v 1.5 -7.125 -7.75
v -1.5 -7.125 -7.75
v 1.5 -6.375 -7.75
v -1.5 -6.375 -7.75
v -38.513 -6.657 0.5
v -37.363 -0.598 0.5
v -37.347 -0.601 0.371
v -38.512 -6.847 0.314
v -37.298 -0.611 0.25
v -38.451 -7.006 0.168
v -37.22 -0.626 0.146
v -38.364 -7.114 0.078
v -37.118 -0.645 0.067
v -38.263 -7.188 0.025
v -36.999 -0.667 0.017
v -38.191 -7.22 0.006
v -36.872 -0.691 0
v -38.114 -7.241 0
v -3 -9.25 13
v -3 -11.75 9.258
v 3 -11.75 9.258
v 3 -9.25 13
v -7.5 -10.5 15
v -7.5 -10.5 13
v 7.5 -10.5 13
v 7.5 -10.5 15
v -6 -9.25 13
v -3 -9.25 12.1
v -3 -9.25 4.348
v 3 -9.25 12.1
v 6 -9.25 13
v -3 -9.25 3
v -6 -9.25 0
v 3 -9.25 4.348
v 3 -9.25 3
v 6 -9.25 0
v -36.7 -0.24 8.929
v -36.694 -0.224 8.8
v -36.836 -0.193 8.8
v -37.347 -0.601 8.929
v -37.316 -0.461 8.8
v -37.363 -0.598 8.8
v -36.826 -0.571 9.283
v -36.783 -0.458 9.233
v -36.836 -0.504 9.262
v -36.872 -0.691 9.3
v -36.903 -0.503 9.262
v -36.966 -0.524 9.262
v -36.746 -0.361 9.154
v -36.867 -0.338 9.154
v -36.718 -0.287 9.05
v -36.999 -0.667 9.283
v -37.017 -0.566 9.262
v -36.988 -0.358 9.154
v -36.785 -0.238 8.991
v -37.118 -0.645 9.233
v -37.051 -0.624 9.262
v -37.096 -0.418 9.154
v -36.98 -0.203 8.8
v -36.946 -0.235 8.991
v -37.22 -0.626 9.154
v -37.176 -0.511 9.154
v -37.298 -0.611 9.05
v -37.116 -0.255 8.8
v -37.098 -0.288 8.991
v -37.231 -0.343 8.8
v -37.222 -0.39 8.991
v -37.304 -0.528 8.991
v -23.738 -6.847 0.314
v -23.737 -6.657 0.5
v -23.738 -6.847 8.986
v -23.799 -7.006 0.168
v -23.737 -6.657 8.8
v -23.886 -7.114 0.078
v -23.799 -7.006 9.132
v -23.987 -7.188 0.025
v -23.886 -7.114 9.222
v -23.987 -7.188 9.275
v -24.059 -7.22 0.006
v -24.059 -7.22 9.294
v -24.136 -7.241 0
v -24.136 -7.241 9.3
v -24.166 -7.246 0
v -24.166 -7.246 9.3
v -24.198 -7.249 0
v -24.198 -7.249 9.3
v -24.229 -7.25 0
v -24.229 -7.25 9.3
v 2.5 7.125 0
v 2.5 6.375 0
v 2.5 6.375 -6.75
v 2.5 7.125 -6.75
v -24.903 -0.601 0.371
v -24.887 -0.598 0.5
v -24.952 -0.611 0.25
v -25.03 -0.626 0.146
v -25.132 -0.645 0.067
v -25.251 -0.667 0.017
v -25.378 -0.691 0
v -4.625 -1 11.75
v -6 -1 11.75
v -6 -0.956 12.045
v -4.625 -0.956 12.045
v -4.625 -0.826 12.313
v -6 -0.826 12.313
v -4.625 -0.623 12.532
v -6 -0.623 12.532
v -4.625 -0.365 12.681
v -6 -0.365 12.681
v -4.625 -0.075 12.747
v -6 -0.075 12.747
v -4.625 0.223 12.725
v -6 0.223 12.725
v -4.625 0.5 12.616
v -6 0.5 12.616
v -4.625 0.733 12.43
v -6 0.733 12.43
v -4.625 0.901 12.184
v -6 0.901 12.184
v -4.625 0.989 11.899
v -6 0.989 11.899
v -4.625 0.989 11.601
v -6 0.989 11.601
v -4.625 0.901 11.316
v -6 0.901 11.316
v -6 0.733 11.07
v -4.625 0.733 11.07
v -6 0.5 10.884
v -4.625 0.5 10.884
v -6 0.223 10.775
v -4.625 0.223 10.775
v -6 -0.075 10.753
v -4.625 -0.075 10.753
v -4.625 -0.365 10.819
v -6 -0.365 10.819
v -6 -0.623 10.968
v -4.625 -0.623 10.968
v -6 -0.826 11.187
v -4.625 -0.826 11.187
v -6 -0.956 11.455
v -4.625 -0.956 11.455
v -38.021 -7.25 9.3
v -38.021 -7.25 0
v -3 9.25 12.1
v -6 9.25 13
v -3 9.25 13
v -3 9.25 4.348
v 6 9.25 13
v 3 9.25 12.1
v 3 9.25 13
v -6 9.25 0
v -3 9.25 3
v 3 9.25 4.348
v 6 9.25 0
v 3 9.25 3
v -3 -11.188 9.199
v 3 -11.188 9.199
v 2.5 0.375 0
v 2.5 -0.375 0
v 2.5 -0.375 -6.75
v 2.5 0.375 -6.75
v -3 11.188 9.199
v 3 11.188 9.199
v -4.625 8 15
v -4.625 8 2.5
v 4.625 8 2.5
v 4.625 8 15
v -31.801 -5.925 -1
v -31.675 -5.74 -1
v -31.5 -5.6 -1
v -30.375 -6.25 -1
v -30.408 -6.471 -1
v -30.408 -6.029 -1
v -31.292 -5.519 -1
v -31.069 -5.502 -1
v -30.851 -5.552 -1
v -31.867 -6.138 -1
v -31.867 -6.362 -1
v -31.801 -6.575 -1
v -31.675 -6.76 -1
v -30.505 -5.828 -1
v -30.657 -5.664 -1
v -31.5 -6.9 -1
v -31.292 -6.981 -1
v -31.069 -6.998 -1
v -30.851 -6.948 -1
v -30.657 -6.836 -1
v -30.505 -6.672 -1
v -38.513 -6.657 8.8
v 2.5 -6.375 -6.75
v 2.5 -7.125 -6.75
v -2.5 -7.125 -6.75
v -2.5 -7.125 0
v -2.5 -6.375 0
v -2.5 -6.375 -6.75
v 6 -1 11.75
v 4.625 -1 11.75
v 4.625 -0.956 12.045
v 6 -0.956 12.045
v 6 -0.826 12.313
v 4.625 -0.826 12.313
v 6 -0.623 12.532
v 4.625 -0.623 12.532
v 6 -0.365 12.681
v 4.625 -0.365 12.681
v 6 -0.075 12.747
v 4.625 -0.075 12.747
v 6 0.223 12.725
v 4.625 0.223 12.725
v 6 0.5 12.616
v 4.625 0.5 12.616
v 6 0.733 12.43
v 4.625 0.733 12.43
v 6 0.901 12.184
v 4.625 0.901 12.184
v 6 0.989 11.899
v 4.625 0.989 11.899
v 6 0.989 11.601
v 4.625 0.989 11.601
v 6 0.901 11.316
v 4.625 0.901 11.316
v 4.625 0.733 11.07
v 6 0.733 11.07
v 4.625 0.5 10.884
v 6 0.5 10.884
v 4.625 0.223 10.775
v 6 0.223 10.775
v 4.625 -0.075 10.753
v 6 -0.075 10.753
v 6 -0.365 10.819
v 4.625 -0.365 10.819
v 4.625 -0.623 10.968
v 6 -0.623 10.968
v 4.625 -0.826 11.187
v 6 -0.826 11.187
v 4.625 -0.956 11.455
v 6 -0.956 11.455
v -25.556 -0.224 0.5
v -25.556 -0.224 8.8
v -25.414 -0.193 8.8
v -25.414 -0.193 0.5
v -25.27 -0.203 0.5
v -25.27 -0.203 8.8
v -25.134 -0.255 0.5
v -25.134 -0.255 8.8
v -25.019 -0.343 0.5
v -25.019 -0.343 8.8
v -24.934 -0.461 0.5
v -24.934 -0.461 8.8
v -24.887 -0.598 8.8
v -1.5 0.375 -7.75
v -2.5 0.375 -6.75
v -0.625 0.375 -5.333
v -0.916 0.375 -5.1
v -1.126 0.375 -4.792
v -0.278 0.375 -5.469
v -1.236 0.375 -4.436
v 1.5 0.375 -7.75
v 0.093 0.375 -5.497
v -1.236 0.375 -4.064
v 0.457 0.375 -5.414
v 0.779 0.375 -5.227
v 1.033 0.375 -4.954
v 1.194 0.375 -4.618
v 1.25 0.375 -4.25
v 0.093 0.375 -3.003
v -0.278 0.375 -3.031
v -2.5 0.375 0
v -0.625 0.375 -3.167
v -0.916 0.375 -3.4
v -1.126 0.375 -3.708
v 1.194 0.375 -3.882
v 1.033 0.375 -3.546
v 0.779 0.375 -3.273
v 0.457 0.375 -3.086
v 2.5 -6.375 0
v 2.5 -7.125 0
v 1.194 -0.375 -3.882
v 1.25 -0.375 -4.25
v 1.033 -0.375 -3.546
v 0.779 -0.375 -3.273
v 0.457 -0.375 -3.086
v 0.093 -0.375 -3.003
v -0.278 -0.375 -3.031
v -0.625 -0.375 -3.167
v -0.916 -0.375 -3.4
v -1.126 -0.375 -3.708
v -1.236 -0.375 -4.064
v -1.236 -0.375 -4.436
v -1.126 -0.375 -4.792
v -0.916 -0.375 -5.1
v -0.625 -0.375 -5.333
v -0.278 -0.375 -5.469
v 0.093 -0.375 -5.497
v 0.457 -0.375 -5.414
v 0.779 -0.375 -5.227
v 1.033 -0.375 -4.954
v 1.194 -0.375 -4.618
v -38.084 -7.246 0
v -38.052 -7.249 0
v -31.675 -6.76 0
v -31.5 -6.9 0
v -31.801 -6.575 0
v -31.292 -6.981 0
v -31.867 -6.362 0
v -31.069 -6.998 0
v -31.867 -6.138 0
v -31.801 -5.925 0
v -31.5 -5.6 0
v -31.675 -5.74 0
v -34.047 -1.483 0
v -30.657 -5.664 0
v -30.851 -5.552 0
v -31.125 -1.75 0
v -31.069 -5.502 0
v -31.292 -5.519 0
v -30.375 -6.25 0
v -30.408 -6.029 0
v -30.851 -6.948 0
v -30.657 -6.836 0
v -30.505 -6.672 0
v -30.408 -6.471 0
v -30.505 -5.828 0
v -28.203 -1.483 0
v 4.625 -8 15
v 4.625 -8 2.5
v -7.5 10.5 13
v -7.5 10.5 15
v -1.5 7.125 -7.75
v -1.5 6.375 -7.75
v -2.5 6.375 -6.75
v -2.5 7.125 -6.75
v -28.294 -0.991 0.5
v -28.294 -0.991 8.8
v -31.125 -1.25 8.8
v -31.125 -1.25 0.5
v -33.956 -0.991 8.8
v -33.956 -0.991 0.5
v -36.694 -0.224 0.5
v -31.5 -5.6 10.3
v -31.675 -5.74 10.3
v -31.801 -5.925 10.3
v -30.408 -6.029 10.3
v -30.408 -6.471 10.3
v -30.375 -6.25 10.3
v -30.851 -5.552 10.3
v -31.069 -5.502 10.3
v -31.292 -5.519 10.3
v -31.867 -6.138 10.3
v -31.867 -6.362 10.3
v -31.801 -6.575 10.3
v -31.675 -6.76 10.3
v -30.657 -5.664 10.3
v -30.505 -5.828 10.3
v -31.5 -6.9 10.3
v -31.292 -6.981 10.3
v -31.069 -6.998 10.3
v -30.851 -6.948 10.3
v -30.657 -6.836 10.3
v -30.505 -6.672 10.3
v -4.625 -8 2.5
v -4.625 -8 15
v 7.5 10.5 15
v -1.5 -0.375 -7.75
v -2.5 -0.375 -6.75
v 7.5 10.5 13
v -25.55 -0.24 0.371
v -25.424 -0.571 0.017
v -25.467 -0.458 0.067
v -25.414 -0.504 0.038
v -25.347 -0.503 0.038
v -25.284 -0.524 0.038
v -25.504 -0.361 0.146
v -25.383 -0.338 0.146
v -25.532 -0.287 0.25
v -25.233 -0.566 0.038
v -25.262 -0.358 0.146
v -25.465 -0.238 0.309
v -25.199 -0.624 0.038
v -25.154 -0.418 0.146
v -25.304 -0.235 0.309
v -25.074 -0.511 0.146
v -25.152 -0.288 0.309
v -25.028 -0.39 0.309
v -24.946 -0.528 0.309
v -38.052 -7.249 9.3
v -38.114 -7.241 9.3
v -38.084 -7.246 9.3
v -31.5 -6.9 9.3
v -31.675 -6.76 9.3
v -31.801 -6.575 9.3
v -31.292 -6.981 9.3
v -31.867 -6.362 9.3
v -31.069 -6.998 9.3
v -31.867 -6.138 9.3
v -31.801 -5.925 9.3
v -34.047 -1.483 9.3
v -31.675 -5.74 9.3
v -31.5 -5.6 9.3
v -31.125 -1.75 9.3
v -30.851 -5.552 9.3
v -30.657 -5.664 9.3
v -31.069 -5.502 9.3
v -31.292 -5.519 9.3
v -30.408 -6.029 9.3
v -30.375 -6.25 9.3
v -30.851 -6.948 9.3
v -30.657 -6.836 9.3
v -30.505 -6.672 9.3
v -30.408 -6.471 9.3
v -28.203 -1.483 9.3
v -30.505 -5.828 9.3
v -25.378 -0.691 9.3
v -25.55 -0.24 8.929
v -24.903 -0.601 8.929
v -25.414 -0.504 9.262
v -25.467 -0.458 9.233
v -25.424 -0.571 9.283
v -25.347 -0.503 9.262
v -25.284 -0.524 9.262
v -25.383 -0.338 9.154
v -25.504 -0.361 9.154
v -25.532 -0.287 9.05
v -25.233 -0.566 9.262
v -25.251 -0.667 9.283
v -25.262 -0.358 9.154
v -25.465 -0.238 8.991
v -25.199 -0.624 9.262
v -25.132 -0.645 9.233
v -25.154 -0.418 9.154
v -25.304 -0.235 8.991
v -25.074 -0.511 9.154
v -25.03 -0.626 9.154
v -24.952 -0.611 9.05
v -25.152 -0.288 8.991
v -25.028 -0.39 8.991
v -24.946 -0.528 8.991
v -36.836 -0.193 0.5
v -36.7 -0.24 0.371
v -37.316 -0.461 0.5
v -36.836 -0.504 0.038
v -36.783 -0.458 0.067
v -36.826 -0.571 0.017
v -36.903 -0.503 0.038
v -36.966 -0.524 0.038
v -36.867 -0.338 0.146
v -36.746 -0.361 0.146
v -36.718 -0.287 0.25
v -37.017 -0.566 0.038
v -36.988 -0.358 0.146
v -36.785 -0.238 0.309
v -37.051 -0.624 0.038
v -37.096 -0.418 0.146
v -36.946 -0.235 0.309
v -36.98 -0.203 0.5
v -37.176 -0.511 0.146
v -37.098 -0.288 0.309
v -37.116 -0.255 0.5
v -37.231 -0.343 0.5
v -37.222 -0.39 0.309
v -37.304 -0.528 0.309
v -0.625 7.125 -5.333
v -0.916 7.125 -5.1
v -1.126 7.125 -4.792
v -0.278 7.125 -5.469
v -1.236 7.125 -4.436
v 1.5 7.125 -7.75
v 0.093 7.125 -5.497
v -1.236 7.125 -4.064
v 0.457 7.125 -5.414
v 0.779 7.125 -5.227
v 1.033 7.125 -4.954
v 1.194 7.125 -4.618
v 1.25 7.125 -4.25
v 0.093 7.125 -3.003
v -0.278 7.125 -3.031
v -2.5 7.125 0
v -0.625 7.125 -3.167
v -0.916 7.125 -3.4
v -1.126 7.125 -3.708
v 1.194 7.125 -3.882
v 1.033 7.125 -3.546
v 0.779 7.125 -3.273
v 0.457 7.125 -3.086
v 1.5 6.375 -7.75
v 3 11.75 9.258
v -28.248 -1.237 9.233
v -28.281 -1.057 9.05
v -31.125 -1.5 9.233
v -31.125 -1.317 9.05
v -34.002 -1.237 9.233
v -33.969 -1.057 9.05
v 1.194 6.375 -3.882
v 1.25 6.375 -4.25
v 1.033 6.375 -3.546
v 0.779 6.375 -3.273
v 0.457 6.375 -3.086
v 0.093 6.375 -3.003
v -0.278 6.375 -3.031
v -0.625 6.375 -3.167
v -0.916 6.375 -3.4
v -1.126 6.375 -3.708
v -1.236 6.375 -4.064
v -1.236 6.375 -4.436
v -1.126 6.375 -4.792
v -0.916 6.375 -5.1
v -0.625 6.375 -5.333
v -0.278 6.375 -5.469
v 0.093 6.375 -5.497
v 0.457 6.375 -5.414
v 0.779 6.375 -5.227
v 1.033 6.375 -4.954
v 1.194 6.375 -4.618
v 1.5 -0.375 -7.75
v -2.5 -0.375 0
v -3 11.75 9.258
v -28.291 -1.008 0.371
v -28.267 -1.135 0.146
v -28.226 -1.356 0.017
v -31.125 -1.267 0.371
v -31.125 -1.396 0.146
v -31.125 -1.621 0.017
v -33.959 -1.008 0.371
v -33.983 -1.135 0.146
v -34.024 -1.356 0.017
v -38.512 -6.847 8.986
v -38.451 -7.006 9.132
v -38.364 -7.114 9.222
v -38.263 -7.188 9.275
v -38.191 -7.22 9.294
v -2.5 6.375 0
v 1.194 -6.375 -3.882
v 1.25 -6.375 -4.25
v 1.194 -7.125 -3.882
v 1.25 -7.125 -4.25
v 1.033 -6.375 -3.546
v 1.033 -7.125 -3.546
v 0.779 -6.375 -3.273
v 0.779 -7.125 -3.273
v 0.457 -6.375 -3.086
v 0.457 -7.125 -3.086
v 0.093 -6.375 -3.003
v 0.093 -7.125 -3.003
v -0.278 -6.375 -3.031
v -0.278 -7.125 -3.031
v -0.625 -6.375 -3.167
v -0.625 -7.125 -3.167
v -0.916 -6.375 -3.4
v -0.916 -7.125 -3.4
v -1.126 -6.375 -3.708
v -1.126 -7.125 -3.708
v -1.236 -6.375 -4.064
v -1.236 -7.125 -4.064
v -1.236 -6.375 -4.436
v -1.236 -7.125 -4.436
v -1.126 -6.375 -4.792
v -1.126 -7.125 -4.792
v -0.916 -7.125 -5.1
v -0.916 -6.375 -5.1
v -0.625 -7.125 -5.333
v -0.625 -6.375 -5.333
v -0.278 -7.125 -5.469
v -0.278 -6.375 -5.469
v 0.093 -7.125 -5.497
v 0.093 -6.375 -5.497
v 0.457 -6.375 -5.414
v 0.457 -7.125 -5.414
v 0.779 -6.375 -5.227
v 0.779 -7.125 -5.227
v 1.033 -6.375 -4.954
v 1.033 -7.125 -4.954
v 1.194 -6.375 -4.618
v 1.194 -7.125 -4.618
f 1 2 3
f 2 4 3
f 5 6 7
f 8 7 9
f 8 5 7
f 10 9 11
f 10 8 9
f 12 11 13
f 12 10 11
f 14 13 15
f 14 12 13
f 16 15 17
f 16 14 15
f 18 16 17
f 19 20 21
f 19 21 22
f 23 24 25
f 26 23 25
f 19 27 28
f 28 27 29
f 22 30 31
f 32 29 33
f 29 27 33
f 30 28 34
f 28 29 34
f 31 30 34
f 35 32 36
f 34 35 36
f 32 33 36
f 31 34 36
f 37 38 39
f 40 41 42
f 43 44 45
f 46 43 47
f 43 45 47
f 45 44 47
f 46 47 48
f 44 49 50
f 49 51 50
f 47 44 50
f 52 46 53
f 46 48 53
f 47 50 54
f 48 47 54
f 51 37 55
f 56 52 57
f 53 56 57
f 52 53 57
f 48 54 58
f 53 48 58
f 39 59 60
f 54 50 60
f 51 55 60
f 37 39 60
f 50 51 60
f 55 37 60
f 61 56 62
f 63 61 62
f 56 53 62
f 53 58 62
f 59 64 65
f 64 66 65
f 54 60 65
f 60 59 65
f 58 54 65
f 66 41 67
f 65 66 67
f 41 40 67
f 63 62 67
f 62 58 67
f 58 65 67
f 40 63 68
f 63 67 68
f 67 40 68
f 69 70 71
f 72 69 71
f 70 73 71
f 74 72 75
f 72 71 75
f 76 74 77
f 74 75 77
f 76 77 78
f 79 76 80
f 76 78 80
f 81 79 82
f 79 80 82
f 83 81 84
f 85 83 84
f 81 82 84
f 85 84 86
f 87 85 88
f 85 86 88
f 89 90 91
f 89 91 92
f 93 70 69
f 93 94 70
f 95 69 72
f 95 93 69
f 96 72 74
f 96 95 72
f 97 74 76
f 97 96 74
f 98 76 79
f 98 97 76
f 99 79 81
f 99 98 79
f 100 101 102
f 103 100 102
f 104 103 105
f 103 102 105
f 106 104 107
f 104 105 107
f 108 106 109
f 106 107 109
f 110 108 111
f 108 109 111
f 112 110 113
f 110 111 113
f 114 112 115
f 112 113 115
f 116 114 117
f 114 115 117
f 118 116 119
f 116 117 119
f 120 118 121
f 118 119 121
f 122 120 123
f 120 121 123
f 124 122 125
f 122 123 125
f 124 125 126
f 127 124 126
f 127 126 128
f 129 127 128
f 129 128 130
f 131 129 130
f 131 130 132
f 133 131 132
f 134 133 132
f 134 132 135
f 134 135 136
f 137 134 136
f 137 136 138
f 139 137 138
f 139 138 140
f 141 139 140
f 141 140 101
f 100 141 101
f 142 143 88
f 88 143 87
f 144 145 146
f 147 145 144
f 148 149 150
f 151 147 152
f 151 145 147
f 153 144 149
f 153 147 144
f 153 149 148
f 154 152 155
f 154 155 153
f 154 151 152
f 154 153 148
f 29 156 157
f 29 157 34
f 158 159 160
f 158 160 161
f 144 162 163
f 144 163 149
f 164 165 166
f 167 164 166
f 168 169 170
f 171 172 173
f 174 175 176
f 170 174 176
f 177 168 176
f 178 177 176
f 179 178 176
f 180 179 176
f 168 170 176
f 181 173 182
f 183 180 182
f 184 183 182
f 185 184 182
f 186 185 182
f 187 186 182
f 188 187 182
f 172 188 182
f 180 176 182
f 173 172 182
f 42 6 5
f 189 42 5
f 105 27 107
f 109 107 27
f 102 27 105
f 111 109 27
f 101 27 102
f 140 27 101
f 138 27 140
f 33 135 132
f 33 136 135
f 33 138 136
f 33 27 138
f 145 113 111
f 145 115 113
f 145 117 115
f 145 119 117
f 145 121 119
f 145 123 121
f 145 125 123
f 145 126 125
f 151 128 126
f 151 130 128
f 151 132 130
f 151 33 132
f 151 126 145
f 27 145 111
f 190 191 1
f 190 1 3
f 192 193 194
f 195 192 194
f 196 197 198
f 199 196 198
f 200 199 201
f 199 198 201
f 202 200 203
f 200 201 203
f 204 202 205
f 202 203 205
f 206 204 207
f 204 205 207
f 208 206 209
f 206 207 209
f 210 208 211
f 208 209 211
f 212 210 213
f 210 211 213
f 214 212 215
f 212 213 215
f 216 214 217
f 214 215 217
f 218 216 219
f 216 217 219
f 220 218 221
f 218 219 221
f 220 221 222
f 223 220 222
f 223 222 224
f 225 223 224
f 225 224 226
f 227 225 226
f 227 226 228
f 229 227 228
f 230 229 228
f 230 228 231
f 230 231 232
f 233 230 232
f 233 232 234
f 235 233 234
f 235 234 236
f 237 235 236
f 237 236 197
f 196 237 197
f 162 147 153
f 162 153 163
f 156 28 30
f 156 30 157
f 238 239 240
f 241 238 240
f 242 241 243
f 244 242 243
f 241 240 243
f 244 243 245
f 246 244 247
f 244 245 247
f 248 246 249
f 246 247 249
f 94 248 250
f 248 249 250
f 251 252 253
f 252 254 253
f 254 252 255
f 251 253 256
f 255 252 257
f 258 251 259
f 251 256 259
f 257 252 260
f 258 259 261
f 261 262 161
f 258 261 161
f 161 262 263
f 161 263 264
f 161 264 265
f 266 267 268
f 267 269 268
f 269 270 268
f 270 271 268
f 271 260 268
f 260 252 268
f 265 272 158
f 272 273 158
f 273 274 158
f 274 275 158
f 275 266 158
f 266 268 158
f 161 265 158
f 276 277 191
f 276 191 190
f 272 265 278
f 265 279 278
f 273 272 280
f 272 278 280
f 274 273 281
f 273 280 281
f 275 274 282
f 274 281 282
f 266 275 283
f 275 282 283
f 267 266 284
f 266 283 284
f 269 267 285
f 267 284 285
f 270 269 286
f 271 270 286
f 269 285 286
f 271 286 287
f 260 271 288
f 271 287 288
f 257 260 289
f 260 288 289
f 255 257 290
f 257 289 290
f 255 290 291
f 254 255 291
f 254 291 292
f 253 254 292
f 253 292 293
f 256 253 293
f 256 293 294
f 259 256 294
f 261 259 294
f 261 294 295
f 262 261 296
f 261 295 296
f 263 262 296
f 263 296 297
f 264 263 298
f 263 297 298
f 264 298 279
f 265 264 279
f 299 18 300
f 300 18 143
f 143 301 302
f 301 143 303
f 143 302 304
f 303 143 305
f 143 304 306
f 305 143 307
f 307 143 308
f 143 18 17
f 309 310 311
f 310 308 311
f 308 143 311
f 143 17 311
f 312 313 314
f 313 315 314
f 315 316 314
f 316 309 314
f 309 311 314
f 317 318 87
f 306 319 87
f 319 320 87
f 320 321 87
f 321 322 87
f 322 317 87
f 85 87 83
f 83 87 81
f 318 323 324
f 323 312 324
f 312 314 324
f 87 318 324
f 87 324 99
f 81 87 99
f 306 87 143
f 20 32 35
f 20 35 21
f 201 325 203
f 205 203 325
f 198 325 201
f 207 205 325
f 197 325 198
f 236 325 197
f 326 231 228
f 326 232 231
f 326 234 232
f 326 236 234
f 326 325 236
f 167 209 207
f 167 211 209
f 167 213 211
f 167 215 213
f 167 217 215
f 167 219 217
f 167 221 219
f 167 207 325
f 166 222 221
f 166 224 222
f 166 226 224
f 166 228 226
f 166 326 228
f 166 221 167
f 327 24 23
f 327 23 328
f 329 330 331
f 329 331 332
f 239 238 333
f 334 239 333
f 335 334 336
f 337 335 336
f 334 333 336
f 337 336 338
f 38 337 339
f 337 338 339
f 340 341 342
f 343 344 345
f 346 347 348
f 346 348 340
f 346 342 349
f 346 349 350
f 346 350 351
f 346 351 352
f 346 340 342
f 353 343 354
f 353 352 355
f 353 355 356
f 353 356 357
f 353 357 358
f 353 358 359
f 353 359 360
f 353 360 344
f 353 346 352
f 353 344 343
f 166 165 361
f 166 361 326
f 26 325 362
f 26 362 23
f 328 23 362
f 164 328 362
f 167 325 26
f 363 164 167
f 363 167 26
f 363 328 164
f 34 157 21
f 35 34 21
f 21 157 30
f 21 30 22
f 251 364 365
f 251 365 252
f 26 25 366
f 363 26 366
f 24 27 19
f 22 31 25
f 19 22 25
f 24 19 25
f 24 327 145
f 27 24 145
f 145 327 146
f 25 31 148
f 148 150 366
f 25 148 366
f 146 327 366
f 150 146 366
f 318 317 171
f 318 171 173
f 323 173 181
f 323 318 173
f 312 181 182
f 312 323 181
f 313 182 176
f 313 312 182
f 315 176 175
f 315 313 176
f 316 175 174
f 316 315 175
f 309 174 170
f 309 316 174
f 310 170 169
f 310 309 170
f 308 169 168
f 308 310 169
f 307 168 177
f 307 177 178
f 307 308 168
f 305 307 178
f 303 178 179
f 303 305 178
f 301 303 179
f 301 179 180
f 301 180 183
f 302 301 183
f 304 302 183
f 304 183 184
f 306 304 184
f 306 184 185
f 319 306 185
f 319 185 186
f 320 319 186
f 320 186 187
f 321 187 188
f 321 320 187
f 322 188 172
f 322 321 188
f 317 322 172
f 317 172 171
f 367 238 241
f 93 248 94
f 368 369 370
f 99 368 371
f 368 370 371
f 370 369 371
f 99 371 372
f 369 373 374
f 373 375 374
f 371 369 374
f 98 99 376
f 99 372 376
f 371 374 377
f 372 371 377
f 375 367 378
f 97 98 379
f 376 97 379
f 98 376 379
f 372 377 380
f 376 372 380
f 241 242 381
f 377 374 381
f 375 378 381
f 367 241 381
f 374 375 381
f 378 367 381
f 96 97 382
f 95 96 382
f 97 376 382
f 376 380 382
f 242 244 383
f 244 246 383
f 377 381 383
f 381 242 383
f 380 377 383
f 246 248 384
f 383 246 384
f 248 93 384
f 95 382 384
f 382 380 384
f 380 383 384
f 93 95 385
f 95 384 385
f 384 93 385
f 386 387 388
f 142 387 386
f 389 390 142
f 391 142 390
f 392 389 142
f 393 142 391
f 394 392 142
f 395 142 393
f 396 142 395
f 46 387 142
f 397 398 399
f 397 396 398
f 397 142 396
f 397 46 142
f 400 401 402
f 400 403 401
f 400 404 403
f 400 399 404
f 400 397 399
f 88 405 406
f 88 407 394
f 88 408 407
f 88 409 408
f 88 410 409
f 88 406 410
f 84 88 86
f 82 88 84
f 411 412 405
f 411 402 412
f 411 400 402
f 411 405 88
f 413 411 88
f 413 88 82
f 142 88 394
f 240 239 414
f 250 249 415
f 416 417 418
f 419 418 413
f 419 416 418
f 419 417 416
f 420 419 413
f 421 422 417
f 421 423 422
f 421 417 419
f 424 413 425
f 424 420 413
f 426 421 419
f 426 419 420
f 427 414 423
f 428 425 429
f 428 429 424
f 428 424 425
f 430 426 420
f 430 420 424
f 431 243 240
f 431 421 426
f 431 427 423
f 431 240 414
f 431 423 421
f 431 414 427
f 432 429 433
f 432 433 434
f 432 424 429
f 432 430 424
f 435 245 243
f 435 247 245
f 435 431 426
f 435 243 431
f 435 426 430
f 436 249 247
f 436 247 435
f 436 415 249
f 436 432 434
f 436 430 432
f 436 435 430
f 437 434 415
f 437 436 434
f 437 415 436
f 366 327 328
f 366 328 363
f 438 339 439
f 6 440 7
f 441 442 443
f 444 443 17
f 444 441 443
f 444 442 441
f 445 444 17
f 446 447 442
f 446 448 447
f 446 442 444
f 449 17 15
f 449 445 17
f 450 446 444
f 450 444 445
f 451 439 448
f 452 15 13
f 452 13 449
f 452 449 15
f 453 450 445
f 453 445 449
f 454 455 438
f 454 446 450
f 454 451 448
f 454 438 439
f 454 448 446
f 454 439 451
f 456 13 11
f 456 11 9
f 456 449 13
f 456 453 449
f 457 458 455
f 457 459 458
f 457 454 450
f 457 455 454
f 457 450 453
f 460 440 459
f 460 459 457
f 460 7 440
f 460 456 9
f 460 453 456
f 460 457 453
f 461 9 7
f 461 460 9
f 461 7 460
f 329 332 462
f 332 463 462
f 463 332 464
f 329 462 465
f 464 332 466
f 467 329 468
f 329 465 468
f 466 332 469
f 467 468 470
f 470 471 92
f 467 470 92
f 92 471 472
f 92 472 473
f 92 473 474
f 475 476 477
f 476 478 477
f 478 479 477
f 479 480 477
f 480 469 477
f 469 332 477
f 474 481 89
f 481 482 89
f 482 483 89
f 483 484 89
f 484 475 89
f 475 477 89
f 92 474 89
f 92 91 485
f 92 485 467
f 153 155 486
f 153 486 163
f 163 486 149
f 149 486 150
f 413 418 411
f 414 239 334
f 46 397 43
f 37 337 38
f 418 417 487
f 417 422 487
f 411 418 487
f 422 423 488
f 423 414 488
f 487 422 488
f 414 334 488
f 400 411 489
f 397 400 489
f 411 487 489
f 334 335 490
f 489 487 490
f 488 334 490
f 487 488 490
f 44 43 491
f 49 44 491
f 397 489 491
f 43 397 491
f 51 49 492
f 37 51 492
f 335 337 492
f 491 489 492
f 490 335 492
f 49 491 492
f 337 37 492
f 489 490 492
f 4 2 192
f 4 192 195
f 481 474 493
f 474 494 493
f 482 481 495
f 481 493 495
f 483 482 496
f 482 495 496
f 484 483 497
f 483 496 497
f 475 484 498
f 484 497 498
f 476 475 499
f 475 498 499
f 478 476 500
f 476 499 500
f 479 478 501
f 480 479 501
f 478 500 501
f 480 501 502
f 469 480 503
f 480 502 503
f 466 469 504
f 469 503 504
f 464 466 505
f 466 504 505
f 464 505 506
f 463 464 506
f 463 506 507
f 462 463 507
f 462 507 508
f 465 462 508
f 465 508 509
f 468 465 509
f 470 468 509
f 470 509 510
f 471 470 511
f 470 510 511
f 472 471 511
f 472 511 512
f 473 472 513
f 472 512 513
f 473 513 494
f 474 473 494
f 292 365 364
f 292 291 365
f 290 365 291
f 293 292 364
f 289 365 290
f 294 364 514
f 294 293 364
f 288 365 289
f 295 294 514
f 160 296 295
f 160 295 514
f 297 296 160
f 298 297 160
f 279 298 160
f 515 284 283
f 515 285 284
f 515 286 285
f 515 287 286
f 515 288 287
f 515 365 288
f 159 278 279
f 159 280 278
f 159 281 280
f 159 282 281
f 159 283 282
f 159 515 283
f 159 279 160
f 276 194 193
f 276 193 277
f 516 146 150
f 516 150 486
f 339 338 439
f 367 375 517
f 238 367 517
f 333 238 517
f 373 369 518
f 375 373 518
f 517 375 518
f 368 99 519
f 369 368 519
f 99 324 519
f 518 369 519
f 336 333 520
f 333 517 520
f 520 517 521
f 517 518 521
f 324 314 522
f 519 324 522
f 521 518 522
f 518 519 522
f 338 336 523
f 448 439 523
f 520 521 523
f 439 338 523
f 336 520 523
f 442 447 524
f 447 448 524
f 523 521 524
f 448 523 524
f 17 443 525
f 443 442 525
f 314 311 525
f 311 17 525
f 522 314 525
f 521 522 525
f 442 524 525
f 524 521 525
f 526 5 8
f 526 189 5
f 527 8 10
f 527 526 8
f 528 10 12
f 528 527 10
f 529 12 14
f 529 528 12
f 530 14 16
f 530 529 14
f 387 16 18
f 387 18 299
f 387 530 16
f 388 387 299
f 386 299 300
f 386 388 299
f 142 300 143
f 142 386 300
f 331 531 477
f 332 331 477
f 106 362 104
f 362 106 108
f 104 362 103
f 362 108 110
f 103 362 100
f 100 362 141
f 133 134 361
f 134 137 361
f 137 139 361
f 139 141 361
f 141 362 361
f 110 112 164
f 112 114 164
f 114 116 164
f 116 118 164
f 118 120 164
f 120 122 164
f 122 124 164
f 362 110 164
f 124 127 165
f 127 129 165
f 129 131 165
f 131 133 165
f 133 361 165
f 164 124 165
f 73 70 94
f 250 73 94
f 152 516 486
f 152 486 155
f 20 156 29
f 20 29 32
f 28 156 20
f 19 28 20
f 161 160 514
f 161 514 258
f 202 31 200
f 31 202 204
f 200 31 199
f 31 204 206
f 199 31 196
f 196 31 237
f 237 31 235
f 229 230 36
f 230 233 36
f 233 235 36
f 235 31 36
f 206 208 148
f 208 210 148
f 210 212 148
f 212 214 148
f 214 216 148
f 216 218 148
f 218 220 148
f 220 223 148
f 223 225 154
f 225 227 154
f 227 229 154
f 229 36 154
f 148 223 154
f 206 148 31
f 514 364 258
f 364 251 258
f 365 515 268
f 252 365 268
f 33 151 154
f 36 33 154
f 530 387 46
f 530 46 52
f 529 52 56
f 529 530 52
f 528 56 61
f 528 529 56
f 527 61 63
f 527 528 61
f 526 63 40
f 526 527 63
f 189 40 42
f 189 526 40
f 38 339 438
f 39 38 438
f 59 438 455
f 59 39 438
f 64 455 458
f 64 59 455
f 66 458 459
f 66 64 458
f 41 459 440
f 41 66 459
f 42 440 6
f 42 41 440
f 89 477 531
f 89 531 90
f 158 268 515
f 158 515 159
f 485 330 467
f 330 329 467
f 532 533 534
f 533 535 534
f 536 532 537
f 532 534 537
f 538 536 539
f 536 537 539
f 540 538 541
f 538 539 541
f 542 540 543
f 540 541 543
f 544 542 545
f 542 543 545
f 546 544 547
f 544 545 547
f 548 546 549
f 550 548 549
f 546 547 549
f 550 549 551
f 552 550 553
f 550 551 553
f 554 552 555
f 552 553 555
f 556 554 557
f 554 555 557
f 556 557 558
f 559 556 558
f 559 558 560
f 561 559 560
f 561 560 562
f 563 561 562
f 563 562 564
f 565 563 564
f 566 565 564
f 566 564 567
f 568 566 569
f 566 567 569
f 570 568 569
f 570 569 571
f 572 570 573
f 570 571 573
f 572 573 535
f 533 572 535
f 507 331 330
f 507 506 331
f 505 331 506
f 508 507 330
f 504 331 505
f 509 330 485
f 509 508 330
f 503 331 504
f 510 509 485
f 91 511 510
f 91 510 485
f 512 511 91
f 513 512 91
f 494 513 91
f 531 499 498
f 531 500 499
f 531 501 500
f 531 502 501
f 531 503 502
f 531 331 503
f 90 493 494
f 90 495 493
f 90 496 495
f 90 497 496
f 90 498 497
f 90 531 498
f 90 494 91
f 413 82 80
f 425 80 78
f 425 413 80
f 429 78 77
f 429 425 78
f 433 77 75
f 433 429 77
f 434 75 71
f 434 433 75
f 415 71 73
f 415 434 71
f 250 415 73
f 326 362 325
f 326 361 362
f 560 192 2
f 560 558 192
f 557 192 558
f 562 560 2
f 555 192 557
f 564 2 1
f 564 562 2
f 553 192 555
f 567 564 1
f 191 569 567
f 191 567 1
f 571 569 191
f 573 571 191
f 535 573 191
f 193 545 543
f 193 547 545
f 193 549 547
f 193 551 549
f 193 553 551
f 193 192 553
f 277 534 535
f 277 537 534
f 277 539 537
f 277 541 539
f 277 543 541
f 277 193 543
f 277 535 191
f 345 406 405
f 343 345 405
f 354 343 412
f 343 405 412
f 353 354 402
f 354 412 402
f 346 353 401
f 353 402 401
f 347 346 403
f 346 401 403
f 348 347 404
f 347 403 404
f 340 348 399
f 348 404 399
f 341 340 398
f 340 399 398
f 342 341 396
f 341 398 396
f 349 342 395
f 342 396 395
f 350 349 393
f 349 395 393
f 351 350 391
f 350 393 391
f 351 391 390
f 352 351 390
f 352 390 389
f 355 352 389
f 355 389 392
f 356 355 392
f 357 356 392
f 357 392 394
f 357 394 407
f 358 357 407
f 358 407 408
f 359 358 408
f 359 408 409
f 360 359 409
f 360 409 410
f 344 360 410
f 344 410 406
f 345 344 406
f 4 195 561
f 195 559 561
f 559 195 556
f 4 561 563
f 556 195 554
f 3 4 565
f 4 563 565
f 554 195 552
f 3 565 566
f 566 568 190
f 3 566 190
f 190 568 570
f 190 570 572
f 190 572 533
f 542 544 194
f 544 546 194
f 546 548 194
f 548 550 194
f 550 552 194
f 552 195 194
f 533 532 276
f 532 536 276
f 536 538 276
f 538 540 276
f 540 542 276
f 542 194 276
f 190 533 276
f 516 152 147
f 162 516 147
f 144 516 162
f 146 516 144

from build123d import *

# Parameters (mm, degrees)
F0_W           = 5
F0_H           = 0.75
F1_DEPTH       = 7.75
F0_W_2         = 12
F0_H_2         = 18.5
F0_W_3         = 9.25
F0_H_3         = 16
F2_DEPTH       = 13
F3_DEPTH       = 2.5
F4_START       = 13
F0_W_4         = 15
F0_H_4         = 21
F4_DEPTH       = 2
F5_R           = 1
F6_DEPTH       = 13.501
F7_START       = -3
F7_DEPTH       = 6
F8_R           = 1.25
F9_DEPTH       = 12.5
F10_SIZE       = 1
F10_2_SIZE     = 1
F10_3_SIZE     = 1
F11_R          = 0.75
F12_DEPTH      = 9.3
F13_DEPTH      = 10.3
F13_DEPTH_BACK = 1
F14_R          = 0.5


with BuildPart() as f1:
    # F0 (on Top) → F1 (new body)
    with BuildSketch(Plane.XY):
        Rectangle(F0_W, F0_H)
    extrude(amount=-F1_DEPTH)


with BuildPart() as f1b:
    # F0 (on Top) → F1, piece 2 (new body)
    with BuildSketch(Plane.XY):
        with Locations((0, 6.75)):
            Rectangle(F0_W, F0_H)
    extrude(amount=-F1_DEPTH)


with BuildPart() as f1c:
    # F0 (on Top) → F1, piece 3 (new body)
    with BuildSketch(Plane.XY):
        with Locations((0, -6.75)):
            Rectangle(F0_W, F0_H)
    extrude(amount=-F1_DEPTH)


with BuildPart() as f2:
    # F0 (on Top) → F2 (new body)
    with BuildSketch(Plane.XY):
        Rectangle(F0_W_2, F0_H_2)
        Rectangle(F0_W_3, F0_H_3, mode=Mode.SUBTRACT)
    extrude(amount=F2_DEPTH)

    # F0 (on Top) → F3 (join)
    with BuildSketch(Plane.XY):
        Rectangle(F0_W_3, F0_H_3)
        with Locations((0, -6.75)):
            Rectangle(F0_W, F0_H, mode=Mode.SUBTRACT)
        Rectangle(F0_W, F0_H, mode=Mode.SUBTRACT)
        with Locations((0, 6.75)):
            Rectangle(F0_W, F0_H, mode=Mode.SUBTRACT)
        with Locations((0, 6.75)):
            Rectangle(F0_W, F0_H)
        Rectangle(F0_W, F0_H)
        with Locations((0, -6.75)):
            Rectangle(F0_W, F0_H)
    extrude(amount=F3_DEPTH)

    # F0 (on Top) → F4 (join)
    with BuildSketch(Plane.XY.offset(F4_START)):
        Rectangle(F0_W_4, F0_H_4)
        Rectangle(F0_W_2, F0_H_2, mode=Mode.SUBTRACT)
        Rectangle(F0_W_2, F0_H_2)
        Rectangle(F0_W_3, F0_H_3, mode=Mode.SUBTRACT)
    extrude(amount=F4_DEPTH)

    # F5 (on face) → F6 (cut, through all)
    with BuildSketch(Plane(origin=(-6, 0, 0), x_dir=(0, -1, 0), z_dir=(-1, 0, 0))):
        with Locations((0, 11.75)):
            Circle(F5_R)
    extrude(amount=-F6_DEPTH, mode=Mode.SUBTRACT)

    # F5 (on face) → F7 (join)
    with BuildSketch(Plane(origin=(-6, 0, 0), x_dir=(0, -1, 0), z_dir=(-1, 0, 0)).offset(F7_START)):
        Polygon((-9.25, 12.1), (-9.25, 13), (-11.75, 9.2583426132), (-9.25, 3), (-9.25, 4.3478405286), (-11.1880398678, 9.199407525), align=None)
        Polygon((11.75, 9.2583426132), (9.25, 13), (9.25, 12.1), (11.1880398678, 9.199407525), (9.25, 4.3478405286), (9.25, 3), align=None)
    extrude(amount=-F7_DEPTH)


with BuildPart() as f9_tool:
    # F8 (on Front) → F9 (new body, symmetric)
    with BuildSketch(Plane.XZ):
        with Locations((0, -4.25)):
            Circle(F8_R)
    extrude(amount=F9_DEPTH, both=True)


with BuildPart() as f1_1:
    add(f1.part)

    # F9: cut by f9_tool
    add(f9_tool.part, mode=Mode.SUBTRACT)

    # F10#2
    f10_2_edges = [f1_1.edges().sort_by_distance(p)[0] for p in [
        (-2.5, 0, -7.75),
        (2.5, 0, -7.75),
    ]]
    chamfer(f10_2_edges, length=F10_2_SIZE)


with BuildPart() as f1b_1:
    add(f1b.part)

    # F9: cut by f9_tool
    add(f9_tool.part, mode=Mode.SUBTRACT)

    # F10
    f10_edges = [f1b_1.edges().sort_by_distance(p)[0] for p in [
        (2.5, 6.75, -7.75),
        (-2.5, 6.75, -7.75),
    ]]
    chamfer(f10_edges, length=F10_SIZE)


with BuildPart() as f1c_1:
    add(f1c.part)

    # F9: cut by f9_tool
    add(f9_tool.part, mode=Mode.SUBTRACT)

    # F10#3
    f10_3_edges = [f1c_1.edges().sort_by_distance(p)[0] for p in [
        (-2.5, -6.75, -7.75),
        (2.5, -6.75, -7.75),
    ]]
    chamfer(f10_3_edges, length=F10_3_SIZE)


with BuildPart() as f12:
    # F11 (on Top) → F12 (new body)
    with BuildSketch(Plane.XY):
        with BuildLine():
            ThreePointArc((-25, 0), (-31.125, -1.25), (-37.25, 0))
            Line((-37.25, 0), (-38.625, -7.25))
            Line((-38.625, -7.25), (-23.625, -7.25))
            Line((-23.625, -7.25), (-25, 0))
        make_face()
        with Locations((-31.125, -6.25)):
            Circle(F11_R, mode=Mode.SUBTRACT)
    extrude(amount=F12_DEPTH)

    # F11 (on Top) → F13 (join, two sides)
    with BuildSketch(Plane.XY) as f13_sk:
        with Locations((-31.125, -6.25)):
            Circle(F11_R)
    extrude(amount=F13_DEPTH)
    extrude(f13_sk.sketch, amount=-F13_DEPTH_BACK)

    # F14
    f14_edges = [f12.edges().sort_by_distance(p)[0] for p in [
        (-25, 0, 4.65),
        (-37.25, 0, 4.65),
        (-31.125, -1.25, 0),
        (-31.125, -1.25, 9.3),
        (-38.625, -7.25, 4.65),
        (-37.9375, -3.625, 0),
        (-37.9375, -3.625, 9.3),
        (-23.625, -7.25, 4.65),
        (-24.3125, -3.625, 0),
        (-24.3125, -3.625, 9.3),
    ]]
    fillet(f14_edges, radius=F14_R)


solid = Compound([f2.part, f1_1.part, f1b_1.part, f1c_1.part, f12.part])
